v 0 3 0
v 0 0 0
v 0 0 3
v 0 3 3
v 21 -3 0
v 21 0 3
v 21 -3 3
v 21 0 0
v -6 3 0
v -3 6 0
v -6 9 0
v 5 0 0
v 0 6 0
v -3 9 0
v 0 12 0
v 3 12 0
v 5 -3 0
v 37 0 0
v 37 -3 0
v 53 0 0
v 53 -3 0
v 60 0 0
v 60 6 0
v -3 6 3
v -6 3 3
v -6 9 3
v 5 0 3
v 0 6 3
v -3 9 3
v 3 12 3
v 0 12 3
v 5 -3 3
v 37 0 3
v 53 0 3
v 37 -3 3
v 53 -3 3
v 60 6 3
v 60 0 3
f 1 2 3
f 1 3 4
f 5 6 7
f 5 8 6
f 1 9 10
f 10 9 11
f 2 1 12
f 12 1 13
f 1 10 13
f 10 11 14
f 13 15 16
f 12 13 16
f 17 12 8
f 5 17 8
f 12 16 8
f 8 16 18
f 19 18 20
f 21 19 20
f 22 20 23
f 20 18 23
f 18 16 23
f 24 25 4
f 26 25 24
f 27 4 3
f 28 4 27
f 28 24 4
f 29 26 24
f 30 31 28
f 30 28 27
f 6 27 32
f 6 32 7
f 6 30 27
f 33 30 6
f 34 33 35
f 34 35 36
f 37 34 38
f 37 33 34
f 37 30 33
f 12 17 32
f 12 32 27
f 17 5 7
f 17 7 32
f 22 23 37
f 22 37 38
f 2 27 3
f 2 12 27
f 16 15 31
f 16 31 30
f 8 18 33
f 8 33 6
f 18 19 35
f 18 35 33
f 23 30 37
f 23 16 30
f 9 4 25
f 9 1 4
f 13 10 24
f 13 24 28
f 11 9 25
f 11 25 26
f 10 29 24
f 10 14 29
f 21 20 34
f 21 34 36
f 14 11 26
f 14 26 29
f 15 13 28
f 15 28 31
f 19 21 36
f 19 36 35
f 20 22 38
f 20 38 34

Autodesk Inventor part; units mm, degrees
ref_plane "YZ Plane" through (0, 0, 0) normal (1, 0, 0) x (0, 1, 0)
ref_plane "XZ Plane" through (0, 0, 0) normal (0, 1, 0) x (-1, 0, 0)
ref_plane "XY Plane" through (0, 0, 0) normal (0, 0, 1) x (1, 0, 0)
sketch "Sketch1" plane through (0, 0, 0) normal (0, 0, 1) x (1, 0, 0)
  line L0 (0, 0) -> (0, 12)
  line L1 (60, 6) -> (60, 0)
  line L2 (60, 0) -> (0, 0)
  line L3 (0, 3) -> (-6, 3)
  line L4 (-6, 3) -> (-6, 9)
  line L5 (-6, 9) -> (-3, 9)
  line L6 (-3, 9) -> (-3, 6)
  line L7 (-3, 6) -> (0, 6)
  line L8 (5, 0) -> (21, 0)
  line L9 (21, 0) -> (21, -3)
  line L10 (21, -3) -> (5, -3)
  line L11 (5, -3) -> (5, 0)
  line L12 (37, 0) -> (53, 0)
  line L13 (53, 0) -> (53, -3)
  line L14 (53, -3) -> (37, -3)
  line L15 (37, -3) -> (37, 0)
  line L16 (0, 12) -> (3, 12)
  line L17 (3, 12) -> (60, 6)
  dimension "d0" = 3
  dimension "d1" = 3
  dimension "d2" = 3
  dimension "d3" = 3
  dimension "d4" = 3
  dimension "d5" = 3
  dimension "d6" = 16
  dimension "d7" = 5
  dimension "d8" = 16
  dimension "d9" = 7
  dimension "d10" = 3
  dimension "d11" = 6
  dimension "d12" = 3
extrude "Extrusion1" add sketch "Sketch1" along normal blind 3
equation "\"BendRadius\" = Thickness"
equation "\"BendReliefWidth\" = Thickness"
equation "\"BendReliefDepth\" = 0.5 * Thickness"
equation "\"CornerReliefSize\" = 4 * Thickness"
equation "\"MinimumRemnant\" = 2 * Thickness"
equation "\"TransitionRadius\" = BendRadius"
equation "\"JacobiRadiusSize\" = BendRadius"
equation "\"GapSize\" = Thickness"
equation "\"Thickness\" = 0.5"
properties part number "tail fin" material "Hardboard"
